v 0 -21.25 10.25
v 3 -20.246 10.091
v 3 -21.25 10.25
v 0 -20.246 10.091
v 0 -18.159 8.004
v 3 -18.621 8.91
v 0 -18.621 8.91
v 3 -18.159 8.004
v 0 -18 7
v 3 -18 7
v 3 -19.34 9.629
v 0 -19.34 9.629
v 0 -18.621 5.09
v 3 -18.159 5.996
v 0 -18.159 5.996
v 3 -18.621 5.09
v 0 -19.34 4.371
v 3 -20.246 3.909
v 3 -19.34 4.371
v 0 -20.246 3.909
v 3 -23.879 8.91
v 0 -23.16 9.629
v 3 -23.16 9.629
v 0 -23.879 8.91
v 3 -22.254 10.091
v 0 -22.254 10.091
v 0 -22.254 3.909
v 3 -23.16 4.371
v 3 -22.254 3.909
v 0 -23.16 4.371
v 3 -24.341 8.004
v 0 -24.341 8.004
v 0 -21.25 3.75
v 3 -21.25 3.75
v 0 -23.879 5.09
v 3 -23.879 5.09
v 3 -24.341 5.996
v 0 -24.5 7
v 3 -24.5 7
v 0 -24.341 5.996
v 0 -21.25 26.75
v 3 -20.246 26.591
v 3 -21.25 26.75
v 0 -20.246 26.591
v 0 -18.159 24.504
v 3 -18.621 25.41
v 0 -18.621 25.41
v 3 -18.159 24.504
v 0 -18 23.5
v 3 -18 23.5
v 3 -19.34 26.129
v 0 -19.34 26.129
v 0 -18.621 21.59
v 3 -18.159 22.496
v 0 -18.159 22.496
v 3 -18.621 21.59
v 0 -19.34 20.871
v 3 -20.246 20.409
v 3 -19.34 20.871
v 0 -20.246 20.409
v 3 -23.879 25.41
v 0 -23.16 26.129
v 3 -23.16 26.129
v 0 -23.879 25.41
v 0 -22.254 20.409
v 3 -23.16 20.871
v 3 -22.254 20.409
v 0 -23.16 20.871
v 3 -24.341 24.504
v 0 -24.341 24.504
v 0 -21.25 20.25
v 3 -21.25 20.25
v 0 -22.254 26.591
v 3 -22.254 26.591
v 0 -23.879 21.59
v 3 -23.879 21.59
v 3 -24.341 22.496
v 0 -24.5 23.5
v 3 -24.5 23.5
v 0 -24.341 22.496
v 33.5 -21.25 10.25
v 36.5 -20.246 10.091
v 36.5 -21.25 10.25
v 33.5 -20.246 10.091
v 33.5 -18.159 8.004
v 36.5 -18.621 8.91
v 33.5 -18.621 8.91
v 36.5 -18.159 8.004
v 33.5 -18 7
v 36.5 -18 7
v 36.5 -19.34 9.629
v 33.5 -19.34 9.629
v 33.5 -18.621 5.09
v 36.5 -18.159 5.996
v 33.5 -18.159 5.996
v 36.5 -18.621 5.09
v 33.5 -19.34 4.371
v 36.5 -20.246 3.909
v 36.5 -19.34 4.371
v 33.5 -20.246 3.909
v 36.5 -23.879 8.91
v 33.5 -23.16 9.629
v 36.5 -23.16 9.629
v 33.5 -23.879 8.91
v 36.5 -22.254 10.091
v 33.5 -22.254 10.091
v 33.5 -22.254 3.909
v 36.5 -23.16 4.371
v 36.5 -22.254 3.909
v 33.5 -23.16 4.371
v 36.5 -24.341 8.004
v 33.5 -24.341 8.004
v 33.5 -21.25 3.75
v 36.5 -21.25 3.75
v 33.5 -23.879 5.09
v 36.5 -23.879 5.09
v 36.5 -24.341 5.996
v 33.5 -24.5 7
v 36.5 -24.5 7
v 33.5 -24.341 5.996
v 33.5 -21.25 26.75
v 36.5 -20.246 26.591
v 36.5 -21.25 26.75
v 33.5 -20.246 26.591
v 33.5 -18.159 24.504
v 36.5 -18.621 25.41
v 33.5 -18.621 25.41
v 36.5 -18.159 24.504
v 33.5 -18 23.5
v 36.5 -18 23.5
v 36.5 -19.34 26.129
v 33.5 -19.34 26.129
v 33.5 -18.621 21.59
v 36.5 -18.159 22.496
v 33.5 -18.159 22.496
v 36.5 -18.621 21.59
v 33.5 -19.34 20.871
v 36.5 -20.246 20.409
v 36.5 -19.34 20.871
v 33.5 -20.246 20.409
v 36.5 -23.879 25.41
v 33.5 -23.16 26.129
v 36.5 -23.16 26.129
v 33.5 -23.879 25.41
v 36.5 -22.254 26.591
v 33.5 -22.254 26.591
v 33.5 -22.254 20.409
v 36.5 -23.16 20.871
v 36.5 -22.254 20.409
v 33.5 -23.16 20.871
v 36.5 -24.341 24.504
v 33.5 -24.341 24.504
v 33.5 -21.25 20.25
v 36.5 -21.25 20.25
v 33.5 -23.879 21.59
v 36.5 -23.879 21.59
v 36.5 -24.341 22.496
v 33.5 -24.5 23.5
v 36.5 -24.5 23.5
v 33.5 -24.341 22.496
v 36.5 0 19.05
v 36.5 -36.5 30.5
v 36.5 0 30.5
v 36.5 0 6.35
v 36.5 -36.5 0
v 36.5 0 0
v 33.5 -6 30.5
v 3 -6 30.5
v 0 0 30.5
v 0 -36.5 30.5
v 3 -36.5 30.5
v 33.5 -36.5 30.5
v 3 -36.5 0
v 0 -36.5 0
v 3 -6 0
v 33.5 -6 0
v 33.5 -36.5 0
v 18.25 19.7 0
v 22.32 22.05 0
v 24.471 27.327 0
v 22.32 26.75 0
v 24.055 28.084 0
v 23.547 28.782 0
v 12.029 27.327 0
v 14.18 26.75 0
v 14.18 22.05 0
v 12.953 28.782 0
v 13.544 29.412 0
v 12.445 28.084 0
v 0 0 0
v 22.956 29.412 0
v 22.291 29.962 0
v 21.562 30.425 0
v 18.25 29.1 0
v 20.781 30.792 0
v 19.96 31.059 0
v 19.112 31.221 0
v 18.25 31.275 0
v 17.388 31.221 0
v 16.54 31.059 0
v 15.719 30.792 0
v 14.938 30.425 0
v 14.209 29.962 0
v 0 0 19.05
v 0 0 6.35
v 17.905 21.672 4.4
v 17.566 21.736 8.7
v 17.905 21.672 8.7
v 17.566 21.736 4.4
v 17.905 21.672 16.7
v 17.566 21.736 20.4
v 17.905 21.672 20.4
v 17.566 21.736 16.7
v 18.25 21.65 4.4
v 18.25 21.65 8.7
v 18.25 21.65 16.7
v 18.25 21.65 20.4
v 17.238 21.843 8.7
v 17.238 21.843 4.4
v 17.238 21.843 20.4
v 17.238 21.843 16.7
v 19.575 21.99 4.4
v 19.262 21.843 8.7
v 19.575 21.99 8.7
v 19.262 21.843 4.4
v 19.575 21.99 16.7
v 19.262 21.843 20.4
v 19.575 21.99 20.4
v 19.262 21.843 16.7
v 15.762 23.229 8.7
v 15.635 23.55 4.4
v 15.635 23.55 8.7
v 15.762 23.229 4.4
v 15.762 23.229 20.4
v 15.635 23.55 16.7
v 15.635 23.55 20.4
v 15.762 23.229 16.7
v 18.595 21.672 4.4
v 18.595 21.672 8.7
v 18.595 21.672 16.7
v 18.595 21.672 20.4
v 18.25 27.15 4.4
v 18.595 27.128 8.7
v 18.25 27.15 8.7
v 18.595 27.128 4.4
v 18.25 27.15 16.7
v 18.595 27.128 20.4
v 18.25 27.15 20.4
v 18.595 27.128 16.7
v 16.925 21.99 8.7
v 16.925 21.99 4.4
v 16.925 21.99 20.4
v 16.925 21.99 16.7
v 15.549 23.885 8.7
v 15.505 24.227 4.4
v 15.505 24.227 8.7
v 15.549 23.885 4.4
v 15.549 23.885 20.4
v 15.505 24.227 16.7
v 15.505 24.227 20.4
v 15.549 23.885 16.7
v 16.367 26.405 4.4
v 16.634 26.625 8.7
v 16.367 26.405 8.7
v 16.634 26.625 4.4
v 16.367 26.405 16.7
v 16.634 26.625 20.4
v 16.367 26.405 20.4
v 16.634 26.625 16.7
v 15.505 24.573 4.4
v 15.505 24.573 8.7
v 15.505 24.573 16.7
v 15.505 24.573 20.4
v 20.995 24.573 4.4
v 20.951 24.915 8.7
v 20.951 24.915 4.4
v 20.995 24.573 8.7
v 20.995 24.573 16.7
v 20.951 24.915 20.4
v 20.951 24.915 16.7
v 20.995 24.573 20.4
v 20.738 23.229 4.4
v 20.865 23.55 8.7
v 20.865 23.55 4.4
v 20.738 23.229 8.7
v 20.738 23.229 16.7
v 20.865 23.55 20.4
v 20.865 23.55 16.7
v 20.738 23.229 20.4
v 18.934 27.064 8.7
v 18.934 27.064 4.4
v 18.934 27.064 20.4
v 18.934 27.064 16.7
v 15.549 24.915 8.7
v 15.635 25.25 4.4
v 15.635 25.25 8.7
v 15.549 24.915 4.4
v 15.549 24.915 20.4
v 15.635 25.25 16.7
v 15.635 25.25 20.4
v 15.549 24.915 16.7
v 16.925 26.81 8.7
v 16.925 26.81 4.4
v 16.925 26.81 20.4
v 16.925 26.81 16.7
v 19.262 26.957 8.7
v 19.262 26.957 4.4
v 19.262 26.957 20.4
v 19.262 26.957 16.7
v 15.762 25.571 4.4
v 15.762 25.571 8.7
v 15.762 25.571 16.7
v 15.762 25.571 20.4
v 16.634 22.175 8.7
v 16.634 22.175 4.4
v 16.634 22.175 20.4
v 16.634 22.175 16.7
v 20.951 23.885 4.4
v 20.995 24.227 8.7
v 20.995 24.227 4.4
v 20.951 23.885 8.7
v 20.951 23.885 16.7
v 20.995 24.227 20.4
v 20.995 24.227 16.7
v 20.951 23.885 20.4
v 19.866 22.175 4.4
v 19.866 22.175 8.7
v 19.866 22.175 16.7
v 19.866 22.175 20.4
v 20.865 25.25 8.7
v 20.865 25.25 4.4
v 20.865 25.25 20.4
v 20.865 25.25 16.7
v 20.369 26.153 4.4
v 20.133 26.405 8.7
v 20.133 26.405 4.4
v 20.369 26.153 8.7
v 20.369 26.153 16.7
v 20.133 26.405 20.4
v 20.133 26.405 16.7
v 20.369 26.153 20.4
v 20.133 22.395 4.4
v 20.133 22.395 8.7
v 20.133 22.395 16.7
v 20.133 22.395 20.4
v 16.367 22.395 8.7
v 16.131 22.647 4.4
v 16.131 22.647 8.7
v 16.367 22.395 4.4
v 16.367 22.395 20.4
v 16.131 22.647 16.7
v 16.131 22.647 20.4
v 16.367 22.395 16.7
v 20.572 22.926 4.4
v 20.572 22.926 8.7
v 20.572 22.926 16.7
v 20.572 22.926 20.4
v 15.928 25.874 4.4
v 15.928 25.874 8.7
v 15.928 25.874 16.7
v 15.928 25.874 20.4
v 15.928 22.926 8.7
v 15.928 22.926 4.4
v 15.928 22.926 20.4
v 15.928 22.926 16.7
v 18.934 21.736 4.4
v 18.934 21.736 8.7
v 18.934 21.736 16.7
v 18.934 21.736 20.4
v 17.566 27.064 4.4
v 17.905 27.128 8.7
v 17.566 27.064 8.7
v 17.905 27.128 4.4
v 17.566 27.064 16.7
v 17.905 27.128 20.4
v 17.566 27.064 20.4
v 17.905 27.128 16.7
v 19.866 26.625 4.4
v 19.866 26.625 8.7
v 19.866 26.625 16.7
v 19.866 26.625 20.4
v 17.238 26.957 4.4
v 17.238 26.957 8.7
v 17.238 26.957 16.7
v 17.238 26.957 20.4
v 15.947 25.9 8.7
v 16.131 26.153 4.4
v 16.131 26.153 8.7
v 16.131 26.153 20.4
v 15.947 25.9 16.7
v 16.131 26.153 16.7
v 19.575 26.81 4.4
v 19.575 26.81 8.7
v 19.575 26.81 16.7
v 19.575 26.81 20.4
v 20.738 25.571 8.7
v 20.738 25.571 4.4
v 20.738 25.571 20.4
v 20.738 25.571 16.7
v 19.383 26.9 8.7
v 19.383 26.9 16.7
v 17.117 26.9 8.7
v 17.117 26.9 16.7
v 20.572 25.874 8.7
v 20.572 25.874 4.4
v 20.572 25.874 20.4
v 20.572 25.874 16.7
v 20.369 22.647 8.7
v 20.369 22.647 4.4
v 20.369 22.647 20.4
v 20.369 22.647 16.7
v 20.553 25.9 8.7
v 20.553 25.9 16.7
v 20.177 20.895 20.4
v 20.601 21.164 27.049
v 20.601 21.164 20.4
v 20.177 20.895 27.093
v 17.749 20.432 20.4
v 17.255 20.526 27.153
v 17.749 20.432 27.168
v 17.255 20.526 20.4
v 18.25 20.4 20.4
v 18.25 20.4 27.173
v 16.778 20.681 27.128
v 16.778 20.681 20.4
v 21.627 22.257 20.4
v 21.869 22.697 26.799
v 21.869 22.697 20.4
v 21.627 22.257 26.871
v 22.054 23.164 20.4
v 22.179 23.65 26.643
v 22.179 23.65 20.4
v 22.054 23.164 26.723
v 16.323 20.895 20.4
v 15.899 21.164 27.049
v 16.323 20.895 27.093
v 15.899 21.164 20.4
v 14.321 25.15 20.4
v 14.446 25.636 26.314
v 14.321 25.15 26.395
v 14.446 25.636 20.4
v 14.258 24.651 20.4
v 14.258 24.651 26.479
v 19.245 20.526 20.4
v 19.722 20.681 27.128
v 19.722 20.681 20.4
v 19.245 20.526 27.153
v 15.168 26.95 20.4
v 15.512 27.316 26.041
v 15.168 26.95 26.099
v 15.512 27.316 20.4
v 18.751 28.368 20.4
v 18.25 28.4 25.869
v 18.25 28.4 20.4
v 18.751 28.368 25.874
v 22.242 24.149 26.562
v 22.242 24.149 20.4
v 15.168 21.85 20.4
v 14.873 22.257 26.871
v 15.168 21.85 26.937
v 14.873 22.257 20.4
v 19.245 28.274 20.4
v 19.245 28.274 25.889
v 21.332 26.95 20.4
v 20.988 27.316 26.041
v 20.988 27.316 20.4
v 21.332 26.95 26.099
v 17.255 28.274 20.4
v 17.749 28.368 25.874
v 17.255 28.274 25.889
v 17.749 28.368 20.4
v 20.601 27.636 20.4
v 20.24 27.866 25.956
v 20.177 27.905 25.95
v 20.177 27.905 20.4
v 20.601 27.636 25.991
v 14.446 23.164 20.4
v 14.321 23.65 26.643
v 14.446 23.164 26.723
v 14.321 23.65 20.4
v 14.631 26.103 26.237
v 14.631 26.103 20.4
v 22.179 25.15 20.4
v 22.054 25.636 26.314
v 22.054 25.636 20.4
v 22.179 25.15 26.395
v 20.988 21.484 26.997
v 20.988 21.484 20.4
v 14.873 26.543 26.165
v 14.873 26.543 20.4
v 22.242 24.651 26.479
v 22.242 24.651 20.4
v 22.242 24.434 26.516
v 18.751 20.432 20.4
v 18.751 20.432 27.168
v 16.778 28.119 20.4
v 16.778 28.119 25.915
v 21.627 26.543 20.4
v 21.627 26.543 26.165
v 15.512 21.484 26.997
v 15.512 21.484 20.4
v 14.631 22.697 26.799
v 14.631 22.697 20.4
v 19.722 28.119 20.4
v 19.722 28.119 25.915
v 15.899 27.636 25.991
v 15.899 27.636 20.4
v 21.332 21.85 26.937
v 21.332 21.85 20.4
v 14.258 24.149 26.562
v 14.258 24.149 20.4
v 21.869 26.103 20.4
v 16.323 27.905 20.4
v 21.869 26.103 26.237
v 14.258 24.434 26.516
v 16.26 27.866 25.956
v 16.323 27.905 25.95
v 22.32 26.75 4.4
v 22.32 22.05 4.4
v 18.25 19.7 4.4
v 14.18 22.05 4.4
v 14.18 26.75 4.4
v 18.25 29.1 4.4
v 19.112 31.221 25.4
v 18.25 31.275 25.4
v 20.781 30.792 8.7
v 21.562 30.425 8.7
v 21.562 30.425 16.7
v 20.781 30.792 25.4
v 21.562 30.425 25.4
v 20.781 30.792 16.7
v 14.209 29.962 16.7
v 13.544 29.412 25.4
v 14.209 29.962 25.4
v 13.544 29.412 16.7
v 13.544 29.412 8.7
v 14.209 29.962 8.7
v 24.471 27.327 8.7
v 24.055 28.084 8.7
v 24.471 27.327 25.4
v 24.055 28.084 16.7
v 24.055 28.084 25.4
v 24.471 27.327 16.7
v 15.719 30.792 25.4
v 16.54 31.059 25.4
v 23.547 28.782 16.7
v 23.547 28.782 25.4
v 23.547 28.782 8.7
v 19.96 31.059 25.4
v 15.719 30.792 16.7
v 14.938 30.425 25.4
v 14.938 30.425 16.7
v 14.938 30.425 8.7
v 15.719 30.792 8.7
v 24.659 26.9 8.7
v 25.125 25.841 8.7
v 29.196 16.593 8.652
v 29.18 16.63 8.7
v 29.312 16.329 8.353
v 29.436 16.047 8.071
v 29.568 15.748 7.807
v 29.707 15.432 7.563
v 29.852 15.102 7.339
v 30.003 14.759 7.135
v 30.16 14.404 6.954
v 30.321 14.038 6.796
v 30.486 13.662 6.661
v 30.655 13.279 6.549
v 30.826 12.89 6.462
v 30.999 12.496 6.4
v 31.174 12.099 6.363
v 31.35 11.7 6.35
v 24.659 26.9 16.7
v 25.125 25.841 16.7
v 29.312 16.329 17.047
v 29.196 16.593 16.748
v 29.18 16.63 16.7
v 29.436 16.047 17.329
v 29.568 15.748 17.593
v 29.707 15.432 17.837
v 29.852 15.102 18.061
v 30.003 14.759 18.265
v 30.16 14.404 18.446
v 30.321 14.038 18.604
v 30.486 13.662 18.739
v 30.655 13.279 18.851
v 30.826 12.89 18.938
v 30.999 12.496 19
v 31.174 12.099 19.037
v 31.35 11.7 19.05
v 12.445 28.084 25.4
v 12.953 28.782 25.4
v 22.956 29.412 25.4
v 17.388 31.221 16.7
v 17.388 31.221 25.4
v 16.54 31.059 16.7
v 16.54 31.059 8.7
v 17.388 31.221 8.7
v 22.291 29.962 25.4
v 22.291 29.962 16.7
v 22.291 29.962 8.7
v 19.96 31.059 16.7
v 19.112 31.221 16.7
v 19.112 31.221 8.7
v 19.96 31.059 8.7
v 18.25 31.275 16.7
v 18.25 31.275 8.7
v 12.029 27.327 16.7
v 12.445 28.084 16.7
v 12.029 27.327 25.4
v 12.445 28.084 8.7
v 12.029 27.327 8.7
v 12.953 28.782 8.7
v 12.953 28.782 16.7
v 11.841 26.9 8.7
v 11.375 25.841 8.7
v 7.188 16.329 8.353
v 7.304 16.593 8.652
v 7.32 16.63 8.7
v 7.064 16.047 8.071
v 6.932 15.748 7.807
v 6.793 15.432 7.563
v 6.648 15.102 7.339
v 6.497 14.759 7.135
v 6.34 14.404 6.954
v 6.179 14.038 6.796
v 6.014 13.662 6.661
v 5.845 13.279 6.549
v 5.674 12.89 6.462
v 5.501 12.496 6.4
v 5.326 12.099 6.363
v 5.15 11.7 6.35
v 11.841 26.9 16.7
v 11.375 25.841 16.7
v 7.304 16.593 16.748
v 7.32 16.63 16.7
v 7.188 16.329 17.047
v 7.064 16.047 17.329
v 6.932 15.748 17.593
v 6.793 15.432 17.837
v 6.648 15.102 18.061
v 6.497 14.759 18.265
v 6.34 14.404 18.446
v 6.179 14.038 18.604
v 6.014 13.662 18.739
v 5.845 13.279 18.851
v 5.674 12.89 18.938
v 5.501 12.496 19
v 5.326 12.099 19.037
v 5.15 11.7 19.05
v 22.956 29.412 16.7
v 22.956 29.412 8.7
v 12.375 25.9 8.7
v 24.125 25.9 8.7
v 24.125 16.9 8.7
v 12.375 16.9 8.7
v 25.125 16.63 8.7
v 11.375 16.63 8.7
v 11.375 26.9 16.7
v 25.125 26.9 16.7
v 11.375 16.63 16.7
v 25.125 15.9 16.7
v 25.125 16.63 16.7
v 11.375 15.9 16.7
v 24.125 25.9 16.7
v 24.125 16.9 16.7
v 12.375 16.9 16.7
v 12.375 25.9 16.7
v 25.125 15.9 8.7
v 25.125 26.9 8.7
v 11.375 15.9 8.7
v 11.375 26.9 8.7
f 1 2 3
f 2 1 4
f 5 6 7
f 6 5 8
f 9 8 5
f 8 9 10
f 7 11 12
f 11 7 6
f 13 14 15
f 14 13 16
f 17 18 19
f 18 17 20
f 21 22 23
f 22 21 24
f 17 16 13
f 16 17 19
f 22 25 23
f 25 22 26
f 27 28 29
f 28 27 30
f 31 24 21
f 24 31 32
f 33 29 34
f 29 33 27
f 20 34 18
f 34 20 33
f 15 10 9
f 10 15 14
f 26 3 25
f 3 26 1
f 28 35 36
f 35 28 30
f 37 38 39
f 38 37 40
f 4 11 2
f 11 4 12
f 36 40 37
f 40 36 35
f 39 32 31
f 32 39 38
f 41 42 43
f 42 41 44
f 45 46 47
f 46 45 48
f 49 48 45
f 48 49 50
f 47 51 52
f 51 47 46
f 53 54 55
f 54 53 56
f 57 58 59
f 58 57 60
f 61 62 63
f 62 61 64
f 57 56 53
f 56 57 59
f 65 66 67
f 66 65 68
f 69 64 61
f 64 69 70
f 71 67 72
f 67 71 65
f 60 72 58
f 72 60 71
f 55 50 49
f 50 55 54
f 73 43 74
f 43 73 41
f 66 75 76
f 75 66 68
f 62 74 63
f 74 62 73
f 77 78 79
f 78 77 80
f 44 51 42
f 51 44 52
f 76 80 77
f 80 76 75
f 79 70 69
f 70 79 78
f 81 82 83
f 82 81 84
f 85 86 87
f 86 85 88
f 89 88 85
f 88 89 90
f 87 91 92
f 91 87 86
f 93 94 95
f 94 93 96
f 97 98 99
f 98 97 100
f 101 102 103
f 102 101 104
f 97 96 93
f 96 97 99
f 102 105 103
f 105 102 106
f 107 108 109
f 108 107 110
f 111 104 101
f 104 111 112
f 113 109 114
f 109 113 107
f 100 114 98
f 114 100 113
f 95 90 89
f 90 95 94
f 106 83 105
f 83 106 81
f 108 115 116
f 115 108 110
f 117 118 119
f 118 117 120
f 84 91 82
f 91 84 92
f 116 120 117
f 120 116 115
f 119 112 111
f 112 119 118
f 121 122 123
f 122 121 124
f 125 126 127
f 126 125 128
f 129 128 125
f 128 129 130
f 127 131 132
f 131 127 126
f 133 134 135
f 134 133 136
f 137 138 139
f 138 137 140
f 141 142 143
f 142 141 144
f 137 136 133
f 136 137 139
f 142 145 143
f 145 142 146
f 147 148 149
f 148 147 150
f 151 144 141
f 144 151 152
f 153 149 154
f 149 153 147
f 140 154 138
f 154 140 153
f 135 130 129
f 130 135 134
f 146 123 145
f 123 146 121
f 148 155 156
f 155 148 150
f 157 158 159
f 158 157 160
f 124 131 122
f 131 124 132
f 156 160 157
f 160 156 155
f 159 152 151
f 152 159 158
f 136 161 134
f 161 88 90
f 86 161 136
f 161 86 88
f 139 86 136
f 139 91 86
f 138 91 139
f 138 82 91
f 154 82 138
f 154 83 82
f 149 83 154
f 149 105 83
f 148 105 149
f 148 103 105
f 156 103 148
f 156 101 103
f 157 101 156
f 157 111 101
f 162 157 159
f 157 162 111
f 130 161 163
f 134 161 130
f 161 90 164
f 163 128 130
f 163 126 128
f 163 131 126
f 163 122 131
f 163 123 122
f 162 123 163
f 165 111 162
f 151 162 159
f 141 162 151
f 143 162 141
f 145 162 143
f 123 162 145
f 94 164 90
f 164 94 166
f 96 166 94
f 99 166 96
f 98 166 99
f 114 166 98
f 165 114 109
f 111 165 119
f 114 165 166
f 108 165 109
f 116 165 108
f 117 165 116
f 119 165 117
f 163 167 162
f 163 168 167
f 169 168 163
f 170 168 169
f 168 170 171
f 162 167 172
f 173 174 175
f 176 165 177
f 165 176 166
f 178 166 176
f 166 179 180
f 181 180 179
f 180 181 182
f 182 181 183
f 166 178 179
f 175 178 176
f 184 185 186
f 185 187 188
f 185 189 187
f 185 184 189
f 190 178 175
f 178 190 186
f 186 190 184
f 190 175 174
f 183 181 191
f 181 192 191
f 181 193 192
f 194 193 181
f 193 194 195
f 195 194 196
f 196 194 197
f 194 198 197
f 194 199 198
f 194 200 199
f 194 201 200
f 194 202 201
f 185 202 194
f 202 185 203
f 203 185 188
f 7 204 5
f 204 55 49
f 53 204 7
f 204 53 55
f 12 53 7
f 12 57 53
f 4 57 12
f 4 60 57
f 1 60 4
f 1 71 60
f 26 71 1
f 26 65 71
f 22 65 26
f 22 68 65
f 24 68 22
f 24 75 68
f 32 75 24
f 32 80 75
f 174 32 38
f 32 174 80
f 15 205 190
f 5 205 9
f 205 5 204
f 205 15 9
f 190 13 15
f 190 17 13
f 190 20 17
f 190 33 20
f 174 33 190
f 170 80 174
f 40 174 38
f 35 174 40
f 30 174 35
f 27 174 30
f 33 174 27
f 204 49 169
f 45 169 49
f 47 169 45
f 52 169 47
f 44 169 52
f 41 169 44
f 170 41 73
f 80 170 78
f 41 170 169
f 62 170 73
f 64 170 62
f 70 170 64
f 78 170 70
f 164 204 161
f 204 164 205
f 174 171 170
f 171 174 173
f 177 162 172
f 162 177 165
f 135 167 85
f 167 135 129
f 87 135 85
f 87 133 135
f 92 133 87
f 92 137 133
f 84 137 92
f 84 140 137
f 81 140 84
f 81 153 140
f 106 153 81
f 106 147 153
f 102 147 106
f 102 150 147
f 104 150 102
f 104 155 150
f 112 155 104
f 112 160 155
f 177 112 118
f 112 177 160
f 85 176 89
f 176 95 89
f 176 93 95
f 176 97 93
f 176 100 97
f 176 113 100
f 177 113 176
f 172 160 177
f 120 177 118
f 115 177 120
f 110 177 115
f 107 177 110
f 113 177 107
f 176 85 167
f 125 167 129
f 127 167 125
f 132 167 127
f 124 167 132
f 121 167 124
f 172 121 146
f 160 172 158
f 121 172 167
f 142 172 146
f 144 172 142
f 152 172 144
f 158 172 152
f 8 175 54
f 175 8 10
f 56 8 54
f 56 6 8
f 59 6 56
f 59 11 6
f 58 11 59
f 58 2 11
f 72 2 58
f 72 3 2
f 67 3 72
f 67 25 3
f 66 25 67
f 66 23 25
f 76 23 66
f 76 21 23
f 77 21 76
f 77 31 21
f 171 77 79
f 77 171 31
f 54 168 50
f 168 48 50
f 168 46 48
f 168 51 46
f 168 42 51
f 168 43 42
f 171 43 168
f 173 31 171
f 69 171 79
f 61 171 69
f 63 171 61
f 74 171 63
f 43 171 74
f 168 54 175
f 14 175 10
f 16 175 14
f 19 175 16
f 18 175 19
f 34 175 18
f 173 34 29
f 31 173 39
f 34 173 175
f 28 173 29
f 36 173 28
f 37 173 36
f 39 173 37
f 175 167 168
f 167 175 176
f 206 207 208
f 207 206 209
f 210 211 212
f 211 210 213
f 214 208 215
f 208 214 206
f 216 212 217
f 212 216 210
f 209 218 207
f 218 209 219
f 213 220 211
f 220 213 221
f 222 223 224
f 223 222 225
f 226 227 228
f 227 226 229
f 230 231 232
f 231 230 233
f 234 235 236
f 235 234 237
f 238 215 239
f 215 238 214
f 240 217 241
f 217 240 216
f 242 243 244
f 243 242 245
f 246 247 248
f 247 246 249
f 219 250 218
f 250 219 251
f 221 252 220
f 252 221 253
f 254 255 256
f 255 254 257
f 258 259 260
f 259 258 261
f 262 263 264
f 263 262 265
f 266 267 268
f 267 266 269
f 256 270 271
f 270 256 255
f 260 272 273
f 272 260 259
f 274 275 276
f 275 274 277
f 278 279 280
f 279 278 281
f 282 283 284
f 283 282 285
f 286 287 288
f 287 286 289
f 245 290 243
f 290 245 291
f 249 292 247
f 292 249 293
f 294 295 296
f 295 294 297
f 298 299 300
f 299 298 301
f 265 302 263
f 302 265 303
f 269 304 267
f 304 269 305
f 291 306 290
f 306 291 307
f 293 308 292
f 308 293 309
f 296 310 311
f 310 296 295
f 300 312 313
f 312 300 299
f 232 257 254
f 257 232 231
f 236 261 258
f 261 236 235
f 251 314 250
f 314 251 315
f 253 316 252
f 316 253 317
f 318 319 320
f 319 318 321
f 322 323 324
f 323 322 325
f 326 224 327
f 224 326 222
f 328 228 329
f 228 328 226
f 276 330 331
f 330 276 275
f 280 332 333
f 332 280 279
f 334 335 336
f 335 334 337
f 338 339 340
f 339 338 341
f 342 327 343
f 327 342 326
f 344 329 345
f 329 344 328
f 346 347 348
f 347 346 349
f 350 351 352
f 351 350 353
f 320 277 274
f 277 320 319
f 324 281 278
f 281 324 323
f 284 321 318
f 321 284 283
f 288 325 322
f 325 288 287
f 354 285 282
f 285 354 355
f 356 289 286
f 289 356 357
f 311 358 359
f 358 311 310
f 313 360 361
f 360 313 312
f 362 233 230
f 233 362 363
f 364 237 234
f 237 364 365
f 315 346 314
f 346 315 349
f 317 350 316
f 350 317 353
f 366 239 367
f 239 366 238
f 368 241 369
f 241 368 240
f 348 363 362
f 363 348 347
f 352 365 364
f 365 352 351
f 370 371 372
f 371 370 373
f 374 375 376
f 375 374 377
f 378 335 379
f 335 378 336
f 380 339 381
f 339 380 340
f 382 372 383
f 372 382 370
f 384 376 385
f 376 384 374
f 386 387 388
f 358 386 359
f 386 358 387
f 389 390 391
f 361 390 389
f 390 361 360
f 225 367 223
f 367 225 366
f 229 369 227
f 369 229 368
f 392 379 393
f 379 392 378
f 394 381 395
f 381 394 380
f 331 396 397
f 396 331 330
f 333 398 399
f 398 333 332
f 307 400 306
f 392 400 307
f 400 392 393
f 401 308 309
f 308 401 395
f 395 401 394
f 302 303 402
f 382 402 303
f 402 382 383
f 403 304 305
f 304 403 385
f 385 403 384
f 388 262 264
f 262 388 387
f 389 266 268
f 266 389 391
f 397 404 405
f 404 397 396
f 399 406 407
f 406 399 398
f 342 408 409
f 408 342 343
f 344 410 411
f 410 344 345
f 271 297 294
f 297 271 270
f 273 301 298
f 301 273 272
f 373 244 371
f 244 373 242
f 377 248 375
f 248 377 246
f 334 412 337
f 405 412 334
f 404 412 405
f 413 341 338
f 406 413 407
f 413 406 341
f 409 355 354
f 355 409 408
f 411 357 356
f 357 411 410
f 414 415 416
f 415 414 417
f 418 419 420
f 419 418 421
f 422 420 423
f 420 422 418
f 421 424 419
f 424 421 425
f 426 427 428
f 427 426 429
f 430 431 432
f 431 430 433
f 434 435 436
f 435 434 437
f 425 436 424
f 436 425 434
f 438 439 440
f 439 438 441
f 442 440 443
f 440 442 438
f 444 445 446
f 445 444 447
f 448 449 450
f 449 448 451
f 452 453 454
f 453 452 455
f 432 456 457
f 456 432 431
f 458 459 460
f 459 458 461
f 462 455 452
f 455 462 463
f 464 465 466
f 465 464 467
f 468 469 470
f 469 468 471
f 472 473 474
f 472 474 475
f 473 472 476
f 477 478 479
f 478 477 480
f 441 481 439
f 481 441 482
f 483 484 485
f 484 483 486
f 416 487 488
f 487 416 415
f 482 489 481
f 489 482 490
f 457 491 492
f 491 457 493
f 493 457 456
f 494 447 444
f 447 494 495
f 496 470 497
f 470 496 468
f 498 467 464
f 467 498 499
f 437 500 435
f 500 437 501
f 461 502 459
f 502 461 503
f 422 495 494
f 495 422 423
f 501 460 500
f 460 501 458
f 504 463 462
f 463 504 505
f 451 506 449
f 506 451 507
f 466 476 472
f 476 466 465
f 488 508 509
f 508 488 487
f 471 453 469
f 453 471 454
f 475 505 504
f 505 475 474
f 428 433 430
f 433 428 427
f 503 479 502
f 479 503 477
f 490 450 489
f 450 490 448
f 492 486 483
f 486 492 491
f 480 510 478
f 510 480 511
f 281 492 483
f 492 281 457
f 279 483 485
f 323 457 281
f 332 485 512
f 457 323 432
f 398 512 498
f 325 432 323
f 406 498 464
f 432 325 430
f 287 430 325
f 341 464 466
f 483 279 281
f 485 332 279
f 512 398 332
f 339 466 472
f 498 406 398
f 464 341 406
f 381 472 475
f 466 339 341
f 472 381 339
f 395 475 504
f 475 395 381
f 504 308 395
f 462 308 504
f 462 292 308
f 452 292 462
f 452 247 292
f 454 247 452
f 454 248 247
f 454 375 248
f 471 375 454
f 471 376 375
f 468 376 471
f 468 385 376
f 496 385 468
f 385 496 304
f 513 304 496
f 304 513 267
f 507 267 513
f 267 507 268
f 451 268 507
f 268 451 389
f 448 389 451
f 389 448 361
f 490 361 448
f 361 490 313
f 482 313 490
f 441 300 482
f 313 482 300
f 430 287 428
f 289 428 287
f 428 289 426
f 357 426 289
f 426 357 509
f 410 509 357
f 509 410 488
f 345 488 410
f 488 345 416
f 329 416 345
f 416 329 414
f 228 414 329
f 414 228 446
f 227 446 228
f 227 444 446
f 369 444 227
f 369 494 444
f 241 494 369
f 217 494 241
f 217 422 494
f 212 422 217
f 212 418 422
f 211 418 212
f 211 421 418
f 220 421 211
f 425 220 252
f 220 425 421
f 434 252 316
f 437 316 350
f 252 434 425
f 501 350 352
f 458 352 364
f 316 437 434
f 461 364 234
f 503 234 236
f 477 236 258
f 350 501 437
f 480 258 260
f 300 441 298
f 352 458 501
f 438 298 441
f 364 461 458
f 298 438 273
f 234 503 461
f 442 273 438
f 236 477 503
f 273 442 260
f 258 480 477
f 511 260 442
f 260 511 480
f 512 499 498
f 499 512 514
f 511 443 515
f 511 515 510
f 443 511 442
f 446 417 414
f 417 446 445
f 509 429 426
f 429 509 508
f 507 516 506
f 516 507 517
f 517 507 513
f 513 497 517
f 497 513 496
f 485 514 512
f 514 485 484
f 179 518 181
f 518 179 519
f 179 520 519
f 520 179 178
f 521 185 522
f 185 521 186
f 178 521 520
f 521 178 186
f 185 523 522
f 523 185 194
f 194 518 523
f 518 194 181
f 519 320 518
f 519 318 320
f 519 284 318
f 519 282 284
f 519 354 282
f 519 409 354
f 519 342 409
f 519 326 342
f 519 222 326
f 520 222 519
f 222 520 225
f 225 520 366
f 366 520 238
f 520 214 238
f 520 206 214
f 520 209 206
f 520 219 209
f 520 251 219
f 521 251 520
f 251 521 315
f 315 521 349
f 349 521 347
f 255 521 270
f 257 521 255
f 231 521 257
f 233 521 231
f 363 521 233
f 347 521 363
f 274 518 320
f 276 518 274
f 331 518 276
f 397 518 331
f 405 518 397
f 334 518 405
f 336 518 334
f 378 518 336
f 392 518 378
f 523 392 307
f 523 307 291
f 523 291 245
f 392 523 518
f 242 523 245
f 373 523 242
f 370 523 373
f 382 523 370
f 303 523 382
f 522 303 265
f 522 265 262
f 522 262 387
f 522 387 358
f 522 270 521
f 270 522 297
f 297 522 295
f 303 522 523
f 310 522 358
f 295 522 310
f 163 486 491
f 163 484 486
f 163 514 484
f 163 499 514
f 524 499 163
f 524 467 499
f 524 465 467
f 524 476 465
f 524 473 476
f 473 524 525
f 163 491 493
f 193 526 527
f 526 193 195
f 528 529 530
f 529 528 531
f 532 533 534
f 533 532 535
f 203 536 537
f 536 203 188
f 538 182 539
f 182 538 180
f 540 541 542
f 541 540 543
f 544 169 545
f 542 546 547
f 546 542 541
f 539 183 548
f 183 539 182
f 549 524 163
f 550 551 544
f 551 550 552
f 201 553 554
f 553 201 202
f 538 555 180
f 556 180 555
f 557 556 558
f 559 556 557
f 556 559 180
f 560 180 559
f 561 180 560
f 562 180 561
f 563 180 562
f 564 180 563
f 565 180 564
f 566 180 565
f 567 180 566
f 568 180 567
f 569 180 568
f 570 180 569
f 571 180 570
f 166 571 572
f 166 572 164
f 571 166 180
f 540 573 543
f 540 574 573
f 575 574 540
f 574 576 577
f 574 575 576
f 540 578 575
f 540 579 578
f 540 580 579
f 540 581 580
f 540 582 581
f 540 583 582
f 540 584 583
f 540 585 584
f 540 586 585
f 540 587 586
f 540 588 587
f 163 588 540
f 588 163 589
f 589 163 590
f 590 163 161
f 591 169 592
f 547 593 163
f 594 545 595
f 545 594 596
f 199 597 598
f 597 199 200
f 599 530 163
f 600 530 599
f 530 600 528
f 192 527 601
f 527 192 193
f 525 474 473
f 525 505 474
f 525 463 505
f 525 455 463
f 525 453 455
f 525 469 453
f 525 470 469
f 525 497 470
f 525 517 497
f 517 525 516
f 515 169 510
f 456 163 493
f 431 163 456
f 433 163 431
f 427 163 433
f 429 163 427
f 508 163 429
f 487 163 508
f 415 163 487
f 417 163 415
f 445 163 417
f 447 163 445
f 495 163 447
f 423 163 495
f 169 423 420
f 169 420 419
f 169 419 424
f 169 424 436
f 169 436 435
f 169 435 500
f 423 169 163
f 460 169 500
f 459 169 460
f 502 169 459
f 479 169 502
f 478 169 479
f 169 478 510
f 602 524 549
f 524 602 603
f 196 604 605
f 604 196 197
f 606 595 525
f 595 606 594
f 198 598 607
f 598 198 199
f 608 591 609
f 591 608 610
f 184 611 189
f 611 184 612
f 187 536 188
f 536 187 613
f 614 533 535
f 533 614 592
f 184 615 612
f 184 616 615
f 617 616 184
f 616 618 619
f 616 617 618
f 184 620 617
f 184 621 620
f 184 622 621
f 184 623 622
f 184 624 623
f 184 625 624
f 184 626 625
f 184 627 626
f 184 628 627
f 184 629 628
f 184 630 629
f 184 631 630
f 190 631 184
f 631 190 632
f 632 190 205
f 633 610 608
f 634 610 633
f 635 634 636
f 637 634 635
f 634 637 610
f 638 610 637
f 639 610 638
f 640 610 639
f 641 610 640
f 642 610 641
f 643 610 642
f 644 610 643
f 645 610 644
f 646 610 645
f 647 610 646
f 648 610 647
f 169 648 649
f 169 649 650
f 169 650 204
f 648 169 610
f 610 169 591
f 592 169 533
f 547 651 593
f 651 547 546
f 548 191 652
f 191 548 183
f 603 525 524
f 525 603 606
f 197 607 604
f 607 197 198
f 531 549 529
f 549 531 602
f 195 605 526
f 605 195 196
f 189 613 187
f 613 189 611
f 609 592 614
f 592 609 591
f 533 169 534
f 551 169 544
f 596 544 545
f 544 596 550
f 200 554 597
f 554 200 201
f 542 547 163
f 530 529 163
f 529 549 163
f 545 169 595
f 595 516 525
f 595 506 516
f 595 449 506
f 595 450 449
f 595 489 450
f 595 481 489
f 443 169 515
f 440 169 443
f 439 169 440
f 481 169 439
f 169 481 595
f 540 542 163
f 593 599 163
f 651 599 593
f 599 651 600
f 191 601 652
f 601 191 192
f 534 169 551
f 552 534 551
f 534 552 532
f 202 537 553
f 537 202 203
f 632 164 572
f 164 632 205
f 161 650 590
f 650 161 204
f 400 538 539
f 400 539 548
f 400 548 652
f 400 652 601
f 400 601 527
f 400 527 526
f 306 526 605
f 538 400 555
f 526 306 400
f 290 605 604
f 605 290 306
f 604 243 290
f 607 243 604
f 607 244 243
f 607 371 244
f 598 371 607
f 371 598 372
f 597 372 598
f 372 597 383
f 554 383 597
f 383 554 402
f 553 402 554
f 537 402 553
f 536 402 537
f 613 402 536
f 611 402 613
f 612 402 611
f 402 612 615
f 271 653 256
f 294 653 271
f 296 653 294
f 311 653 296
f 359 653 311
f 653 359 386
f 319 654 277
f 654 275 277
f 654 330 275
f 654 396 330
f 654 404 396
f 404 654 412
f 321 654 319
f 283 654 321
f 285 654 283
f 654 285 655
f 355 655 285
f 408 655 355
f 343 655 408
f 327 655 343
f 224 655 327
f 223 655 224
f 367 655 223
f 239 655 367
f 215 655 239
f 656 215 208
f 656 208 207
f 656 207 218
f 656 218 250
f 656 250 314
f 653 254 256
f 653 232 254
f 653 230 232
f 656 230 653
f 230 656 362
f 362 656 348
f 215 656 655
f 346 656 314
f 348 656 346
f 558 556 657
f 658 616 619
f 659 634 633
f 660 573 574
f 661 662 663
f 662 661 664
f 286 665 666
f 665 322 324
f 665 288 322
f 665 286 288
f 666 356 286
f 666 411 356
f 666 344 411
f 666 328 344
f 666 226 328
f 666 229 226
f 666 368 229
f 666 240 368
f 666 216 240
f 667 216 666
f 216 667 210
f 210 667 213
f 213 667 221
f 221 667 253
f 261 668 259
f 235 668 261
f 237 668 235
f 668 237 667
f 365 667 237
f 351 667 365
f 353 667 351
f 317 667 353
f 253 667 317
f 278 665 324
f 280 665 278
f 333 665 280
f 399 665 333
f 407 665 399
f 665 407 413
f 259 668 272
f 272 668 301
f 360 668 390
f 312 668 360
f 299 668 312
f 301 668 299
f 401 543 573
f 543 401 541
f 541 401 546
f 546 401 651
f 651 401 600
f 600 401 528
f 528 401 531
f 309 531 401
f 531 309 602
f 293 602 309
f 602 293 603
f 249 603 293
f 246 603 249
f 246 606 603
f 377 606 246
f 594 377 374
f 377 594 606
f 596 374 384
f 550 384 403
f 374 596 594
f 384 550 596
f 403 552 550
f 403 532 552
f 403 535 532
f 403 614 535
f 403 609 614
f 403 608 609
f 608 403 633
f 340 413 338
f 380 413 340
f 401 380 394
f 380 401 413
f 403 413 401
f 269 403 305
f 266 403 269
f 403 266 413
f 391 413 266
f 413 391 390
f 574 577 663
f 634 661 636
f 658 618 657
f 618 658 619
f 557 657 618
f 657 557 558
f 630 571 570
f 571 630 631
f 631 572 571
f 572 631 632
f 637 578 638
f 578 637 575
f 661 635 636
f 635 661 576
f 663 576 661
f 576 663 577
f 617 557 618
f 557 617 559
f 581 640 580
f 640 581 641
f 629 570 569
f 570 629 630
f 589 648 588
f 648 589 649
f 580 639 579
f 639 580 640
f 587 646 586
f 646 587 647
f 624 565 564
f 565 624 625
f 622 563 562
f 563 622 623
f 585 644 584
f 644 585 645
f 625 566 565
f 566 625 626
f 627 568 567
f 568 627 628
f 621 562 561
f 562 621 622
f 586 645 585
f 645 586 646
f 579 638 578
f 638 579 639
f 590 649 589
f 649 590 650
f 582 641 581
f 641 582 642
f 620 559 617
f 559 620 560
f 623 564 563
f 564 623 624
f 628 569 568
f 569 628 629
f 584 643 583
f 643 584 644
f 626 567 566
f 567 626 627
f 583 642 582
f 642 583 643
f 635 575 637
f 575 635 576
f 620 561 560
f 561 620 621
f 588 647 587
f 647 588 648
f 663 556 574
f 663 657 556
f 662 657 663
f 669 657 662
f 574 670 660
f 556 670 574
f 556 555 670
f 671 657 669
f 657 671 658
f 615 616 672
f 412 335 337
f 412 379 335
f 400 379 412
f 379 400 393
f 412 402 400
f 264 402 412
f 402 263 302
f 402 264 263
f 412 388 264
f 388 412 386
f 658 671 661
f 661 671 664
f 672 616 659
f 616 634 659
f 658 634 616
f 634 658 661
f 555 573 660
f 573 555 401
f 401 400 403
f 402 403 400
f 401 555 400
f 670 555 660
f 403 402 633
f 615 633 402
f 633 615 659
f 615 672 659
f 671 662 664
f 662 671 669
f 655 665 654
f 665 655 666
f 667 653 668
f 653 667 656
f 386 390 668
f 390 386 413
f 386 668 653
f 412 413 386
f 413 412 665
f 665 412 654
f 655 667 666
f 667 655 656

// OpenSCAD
// file: ../src/888_5002.scad
include <../parameters.scad>

module 888_5002() {
    joint_width = 8;
    
    difference() {
        hull() {
            translate([0, 0, -1])
                cube([strain_gauge_width*2, strain_gauge_screw_distance*1.75, 4], center=true);

            translate([0, 0, strain_gauge_width*2])
                rotate([0, 90, 0])
                    cylinder(d=M5_screw_diameter*2.5, h=strain_gauge_width*2, center=true, $fn=50);
        }

        translate([-strain_gauge_width-1, 0, strain_gauge_width*2])
        rotate([0, 90, 0])
        union() {
            cylinder(d=M5_screw_diameter, h=strain_gauge_width*2+2, $fn=50);
            cylinder(d=8, h=M5_head_height+1, $fn=50);
            
            translate([0, 0, strain_gauge_width*2+1-M5_nut_height+.1])
            cylinder(d=M5_nut_diameter, h=M5_nut_height, $fn=6);
        }

        translate([0, 0, strain_gauge_width/2])
            cube([strain_gauge_width, strain_gauge_width*2+1, strain_gauge_width], center=true);

        translate([0, 0, strain_gauge_width*3/2])
            cube([joint_width, strain_gauge_width*2, strain_gauge_width*3], center=true);

        translate([0, strain_gauge_screw_distance/2, 0])
            cylinder(d=M4_screw_diameter, h=10, center=true, $fn=20);

        translate([0, -strain_gauge_screw_distance/2, 0])
            cylinder(d=M4_screw_diameter, h=10, center=true, $fn=20);

        translate([0, 0, strain_gauge_width])
            rotate([90, 0, 0])
                cylinder(d=strain_gauge_width, h=strain_gauge_width*2, $fn=100, center=true);
    }
}

888_5002();
// file: ../src/lib/ALU_profile_holder_side.scad
include <../../parameters.scad>

module ALU_profile_holder_side(height) {
    wall_thickness = ALU_profile_holder_wall_thickness;
    
    //díry na přišroubování k Al profilům
    module screws_holes(diameter) {
        translate([0, 0, 7])
            rotate([90, 0, 90])
                cylinder(d=diameter, h=wall_thickness*2, center=true, $fn=20);
        
        translate([0, 0, height-7])
            rotate([90, 0, 90])
                cylinder(d=diameter, h=wall_thickness*2, center=true, $fn=20);
    }
    
    difference() {
        cube([ALU_profile_width+wall_thickness*2, ALU_profile_width + wall_thickness*2, height]);

        translate([wall_thickness, -0.1, -0.1])
            cube([ALU_profile_width, ALU_profile_width + 0.1, height + 0.2]);
        
        translate([wall_thickness*0.5, ALU_profile_width/2, 0]) {
            screws_holes(M6_screw_diameter);
            translate([ALU_profile_width+wall_thickness, 0, 0]) {
                screws_holes(M6_screw_diameter);
            }
        }
    }
}

ALU_profile_holder_side(30);
// file: ../src/888_5003.scad
include <../parameters.scad>
use <./lib/ALU_profile_holder_side.scad>
use <./888_5002.scad>


module 888_5003_A() {
    union() {
        translate([0, -ALU_profile_width-ALU_profile_holder_wall_thickness*2, 0])
        ALU_profile_holder_side(ALU_profile_width);
        
        translate([ALU_profile_width/2+ALU_profile_holder_wall_thickness, -1, 0])
        rotate([-90, 0, 0])
        difference() {
            hull() {
                translate([0, -ALU_profile_width/2, -1])
                    cube([ALU_profile_width+ALU_profile_holder_wall_thickness*2, ALU_profile_width, 4], center=true);
        
                translate([0, -M5_screw_diameter*2.5/2, strain_gauge_width*2])
                    rotate([0, 90, 0])
                        cylinder(d=M5_screw_diameter*2.5, h=strain_gauge_width*2, center=true, $fn=50);
            }
        
        translate([-strain_gauge_width-10, -M5_screw_diameter*2.5/2, strain_gauge_width*2])
        rotate([0, 90, 0])
        union() {
            cylinder(d=M5_screw_diameter, h=strain_gauge_width*2+11, $fn=50);
            cylinder(d=8, h=M5_head_height+10, $fn=50);
            
            translate([0, 0, strain_gauge_width*2+10-M5_nut_height+.1])
            cylinder(d=M5_nut_diameter, h=20, $fn=6);
        }
    
        translate([0, 0, strain_gauge_width/2])
        cube([strain_gauge_width, ALU_profile_width*2+2, strain_gauge_width], center=true);
    
        translate([0, 0, strain_gauge_width*3/2])
        cube([8, ALU_profile_width*2+2, strain_gauge_width*3], center=true);
    
        translate([0, 0, strain_gauge_width])
        rotate([90, 0, 0])
        cylinder(d=strain_gauge_width, h=ALU_profile_width*2+2, $fn=100, center=true);
        }
    }
}

module 888_5003_B() {
    union() {
        translate([0, -ALU_profile_width-ALU_profile_holder_wall_thickness*2, 0])
        ALU_profile_holder_side(ALU_profile_width);
        
        translate([ALU_profile_holder_wall_thickness, -1, ALU_profile_width/2])
        rotate([-90, 90, 0])
        difference() {
            hull() {
                translate([0, -ALU_profile_width/2, -1])
                    cube([ALU_profile_width, ALU_profile_width+ALU_profile_holder_wall_thickness*2, 4], center=true);
        
                translate([(ALU_profile_width-strain_gauge_width*2)/2, -ALU_profile_width/2, strain_gauge_width*2])
                    rotate([0, 90, 0])
                        cylinder(d=M5_screw_diameter*2.5, h=strain_gauge_width*2, center=true, $fn=50);
            }
        
        translate([(ALU_profile_width-strain_gauge_width*2)/2-strain_gauge_width-10, -ALU_profile_width/2, strain_gauge_width*2])
        rotate([0, 90, 0])
        union() {
            cylinder(d=M5_screw_diameter, h=strain_gauge_width*2+11, $fn=50);
            cylinder(d=8, h=M5_head_height+10, $fn=50);
            
            translate([0, 0, strain_gauge_width*2+10-M5_nut_height+.1])
            cylinder(d=M5_nut_diameter, h=20, $fn=6);
        }
    
        translate([(ALU_profile_width-strain_gauge_width*2)/2, 0, strain_gauge_width/2])
        cube([strain_gauge_width, ALU_profile_width*3+2, strain_gauge_width], center=true);
    
        translate([(ALU_profile_width-strain_gauge_width*2)/2, 0, strain_gauge_width*3/2])
        cube([8, ALU_profile_width*3+2, strain_gauge_width*3], center=true);
    
        translate([(ALU_profile_width-strain_gauge_width*2)/2, 0, strain_gauge_width])
        rotate([90, 0, 0])
        cylinder(d=strain_gauge_width, h=ALU_profile_width*2+2, $fn=100, center=true);
        }
    }
}

888_5003_A();

translate([-50, 0, 0])
888_5003_B();
// file: ../parameters.scad
maximum_printable_size = 150;

layer_thickness = 0.3;
global_clearance = 0.5;


//Screw diameter and nut for M10 [mm]
M10_screw_diameter = 10.4;
M10_head_height = 10;
M10_head_diameter = 16+0.5;
M10_nut_height = 10.5;
M10_nut_diameter = 25.5;
M10_nut_pocket = 22.3;

//Screw diameter for M8 [mm]
M8_screw_diameter = 8.6;
M8_head_height = 8;
M8_head_diameter = 13.5;
M8_nut_height = 7.5;
M8_square_nut_thin_height = 4.5;
M8_nut_diameter = 14.4 + 0.5;
M8_nut_pocket = 13 + 0.5;
M8_washer_diameter = 16;
M8_washer_thickness = 1.5;


//Screw diameter and nut for M6 [mm]
M6_screw_diameter=6.5;
M6_head_diameter = 10+0.5;
M6_head_height = 6;
M6_nut_height = 4.9;
M6_nut_diameter = 11.8;
M6_nut_pocket = 10.4;
M6_square_nut_height = 3;
M6_square_nut_diameter = 10;
M6_washer_thickness = 1.6;

//Screw diameter and nut for M5 [mm]
M5_screw_diameter=5.5;
M5_head_height = 5;
M5_head_diameter = 13+0.5;
M5_nut_height = 4.5;
M5_nut_diameter = 9.4;
M5_nut_pocket = 8.4;

//Screw diameter and nut for M4 [mm]
M4_screw_diameter=4.5;
M4_screw_head_height = 4;
M4_nut_height = 3.2;
M4_nut_diameter = 8.4;
M4_nut_pocket = 7.5;

//Screw diameter and nut for M3 [mm]
M3_screw_diameter = 3.2;
M3_nut_height = 2.7;
M3_nut_diameter = 6.6;
M3_nut_pocket = 5.6;
M3_screw_head_height = 3;

//Screw diameter and nut for M2,5 [mm]
M2_5_screw_diameter = 2.7;
M2_5_nut_height = 2.3;
M2_5_nut_diameter = 6;
M2_5_nut_pocket = 5.5;

// kulove lozisko

bearing_efsm_08_h = 33+1;
bearing_efsm_08_m = 22;
bearing_efsm_08_db = 18;
bearing_efsm_08_ag = 10.5;
bearing_efsm_08_n = M4_screw_diameter;
bearing_efsm_08_a1 = 5.5;
bearing_efsm_08_d = 8.25;
bearing_efsm_08_B = 8; // ball height

bearing_efsm_10_h = 38+1;
bearing_efsm_10_m = 26;
bearing_efsm_10_db = 21.9;
bearing_efsm_10_ag = 12+0.2;
bearing_efsm_10_n = M5_screw_diameter;
bearing_efsm_10_a1 = 6.5;
bearing_efsm_10_d = 10.25;


bearing_efsm_12_width = 40+1;
bearing_efsm_12_h = bearing_efsm_12_width;
bearing_efsm_12_boltd = 28/2; // polovina vzdalenosti mezi srouby
bearing_efsm_12_m = bearing_efsm_12_boltd*2;
bearing_efsm_12_db = 25;
bearing_efsm_12_ag = 13;
bearing_efsm_12_a1 = 7;
bearing_efsm_12_n = M5_screw_diameter;
bearing_efsm_12_d = 12.15;
bearing_efsm_12_B = 10; // ball height
bearing_efsm_space = 1;

bearing_efsm_17_width = 54+1;
bearing_efsm_17_h = bearing_efsm_17_width;
bearing_efsm_17_boltd = 38/2; // polovina vzdalenosti mezi srouby
bearing_efsm_17_m = bearing_efsm_17_boltd*2;
bearing_efsm_17_db = 35;
bearing_efsm_17_ag = 18;
bearing_efsm_17_n = M6_screw_diameter;
bearing_efsm_17_a1 = 10;
bearing_efsm_17_B = 17; // ball height

//limcove lozisko
bearing_EFOM_10_L=26; //celkova sirka zakladny
bearing_EFOM_10_d1=10.3;//diametr otvoru real=10 mm
bearing_EFOM_10_dB=22;//diametr vystupku pro ulozeni lozika
bearing_EFOM_10_H=52;//celková delka zakladny
bearing_EFOM_10_J=36;// hole pitch
bearing_EFOM_10_A1=6.5;//vyska pouzdra
bearing_EFOM_10_Ag=12;//celkova vyska
bearing_EFOM_10_N1=5;//sirka otvoru pro sroub
bearing_EFOM_10_N2=8;//delka otvoru pro sroub
bearing_EFOM_10_m=36;//roztec der pro sroub
bearing_EFOM_10_h=9;//vyska lozika


608_bearing_outer_diameter = 22.3;
608_bearing_inner_diameter = 16;
608_bearing_thickness = 7.1;


// 20 KG servo parameters

servo_20kg_axis_offset = 9.375; // jak je osa mimo stredu
servo_20kg_body_x = 42;
servo_20kg_body_y = 21;
servo_20kg_body_z = 40;
servo_20kg_thread_x = 49/2;
servo_20kg_thread_y = 10/2;
servo_20kg_body_below = 10; // jak hluboko je tělo serva pod drzaky na srouby
servo_20kg_below = 25.8; // jak hluboko je páka serva pod drzaky na srouby

servo_20kg_bolt_d = 2.5+0.3;
servo_20kg_nut_d = 5+0.3;


//strain gauge
strain_gauge_width = 12.7;
strain_gauge_length = 75.1;
strain_gauge_screw_distance = 10;

//ALU profile
ALU_profile_width = 30.5;
ALU_profile_holder_wall_thickness = 3;
ALU_profile_groove_width = 8;

//pillow block bearing
//https://www.igus.eu/product/372
//Part no. KSTM-08
KSTM08_screws_distance = 33;         //m
KSTM08_screws_holes_diameter = 4.5;  //d2
KSTM08_flange_thickness = 6;         //h3
KSTM08_case_width = 9;               //C1
KSTM08_case_length = 47;             //a
KSTM08_ball_width = 12;              //B
KSTM08_ball_hole_diameter = 7.85;    //d1


//ložiska pro malý rotor
bearing_outer_diameter = 10.2;    // Rozměr B1 v nákresu s přídavkem na toleranci otvoru
bearing_thickness = 4;        // Rozměr B2 v nákresu
//bearing_shaft_length = 19.5;    // Rozměr B3 v nákresu, Originalni hodnota 19.5
bearing_shaft_length = 20;    // Rozměr B3 v nákresu


//parametry víčka s telemetrickou anténou
S01_sila_materialu=1.2;
S01_vyska_horni_zavit=10;
S01_hloubka_zavitu=4;
S01_prumer_vnitrni=50;
LO_spodni_prumer=17.2;
LO_vyska_bez_krytu=15;
S01_tolerance_zavit=1.5;
R01_vyska_prekryti_statoru=10;

g3_0_cone1 = 70;
g3_0_srcew_dist = 55;



// scale parameters
base_length = 500;
mid_base_width = 500;
mid_base_height = 200;
mid_base_length = 500;
mid_base_x_offset = 50;
base_mid_base_hinge_offset = 50;
tower_height = 185;
tower_angle = atan((mid_base_width/2-ALU_profile_width-10)/tower_height);
tower_arm_length = tower_height/cos(tower_angle);
tower_drag_z_offset = 22;
electro_box_length = 225;
electro_box_width = 165;
electro_box_height = 51.5;

// calibration device parameters
calibration_arm_x_offset = 140;
calibration_arm_y_offset = 50;
// main file
//@set_slicing_config(../slicing/default.ini)

include <../parameters.scad>
use <../src/888_5003.scad>

888_5003_B();
        
difference() {
    translate([ALU_profile_width/2+3, strain_gauge_width*2-4, strain_gauge_width])
    cube([M5_screw_diameter*2.5, M5_screw_diameter*2, 8], center=true);
    
    translate([ALU_profile_width/2+3, strain_gauge_width*2-4, strain_gauge_width-0.5])
    cube([M5_screw_diameter*2.5-2, M5_screw_diameter*2-2, 10], center=true);
}
